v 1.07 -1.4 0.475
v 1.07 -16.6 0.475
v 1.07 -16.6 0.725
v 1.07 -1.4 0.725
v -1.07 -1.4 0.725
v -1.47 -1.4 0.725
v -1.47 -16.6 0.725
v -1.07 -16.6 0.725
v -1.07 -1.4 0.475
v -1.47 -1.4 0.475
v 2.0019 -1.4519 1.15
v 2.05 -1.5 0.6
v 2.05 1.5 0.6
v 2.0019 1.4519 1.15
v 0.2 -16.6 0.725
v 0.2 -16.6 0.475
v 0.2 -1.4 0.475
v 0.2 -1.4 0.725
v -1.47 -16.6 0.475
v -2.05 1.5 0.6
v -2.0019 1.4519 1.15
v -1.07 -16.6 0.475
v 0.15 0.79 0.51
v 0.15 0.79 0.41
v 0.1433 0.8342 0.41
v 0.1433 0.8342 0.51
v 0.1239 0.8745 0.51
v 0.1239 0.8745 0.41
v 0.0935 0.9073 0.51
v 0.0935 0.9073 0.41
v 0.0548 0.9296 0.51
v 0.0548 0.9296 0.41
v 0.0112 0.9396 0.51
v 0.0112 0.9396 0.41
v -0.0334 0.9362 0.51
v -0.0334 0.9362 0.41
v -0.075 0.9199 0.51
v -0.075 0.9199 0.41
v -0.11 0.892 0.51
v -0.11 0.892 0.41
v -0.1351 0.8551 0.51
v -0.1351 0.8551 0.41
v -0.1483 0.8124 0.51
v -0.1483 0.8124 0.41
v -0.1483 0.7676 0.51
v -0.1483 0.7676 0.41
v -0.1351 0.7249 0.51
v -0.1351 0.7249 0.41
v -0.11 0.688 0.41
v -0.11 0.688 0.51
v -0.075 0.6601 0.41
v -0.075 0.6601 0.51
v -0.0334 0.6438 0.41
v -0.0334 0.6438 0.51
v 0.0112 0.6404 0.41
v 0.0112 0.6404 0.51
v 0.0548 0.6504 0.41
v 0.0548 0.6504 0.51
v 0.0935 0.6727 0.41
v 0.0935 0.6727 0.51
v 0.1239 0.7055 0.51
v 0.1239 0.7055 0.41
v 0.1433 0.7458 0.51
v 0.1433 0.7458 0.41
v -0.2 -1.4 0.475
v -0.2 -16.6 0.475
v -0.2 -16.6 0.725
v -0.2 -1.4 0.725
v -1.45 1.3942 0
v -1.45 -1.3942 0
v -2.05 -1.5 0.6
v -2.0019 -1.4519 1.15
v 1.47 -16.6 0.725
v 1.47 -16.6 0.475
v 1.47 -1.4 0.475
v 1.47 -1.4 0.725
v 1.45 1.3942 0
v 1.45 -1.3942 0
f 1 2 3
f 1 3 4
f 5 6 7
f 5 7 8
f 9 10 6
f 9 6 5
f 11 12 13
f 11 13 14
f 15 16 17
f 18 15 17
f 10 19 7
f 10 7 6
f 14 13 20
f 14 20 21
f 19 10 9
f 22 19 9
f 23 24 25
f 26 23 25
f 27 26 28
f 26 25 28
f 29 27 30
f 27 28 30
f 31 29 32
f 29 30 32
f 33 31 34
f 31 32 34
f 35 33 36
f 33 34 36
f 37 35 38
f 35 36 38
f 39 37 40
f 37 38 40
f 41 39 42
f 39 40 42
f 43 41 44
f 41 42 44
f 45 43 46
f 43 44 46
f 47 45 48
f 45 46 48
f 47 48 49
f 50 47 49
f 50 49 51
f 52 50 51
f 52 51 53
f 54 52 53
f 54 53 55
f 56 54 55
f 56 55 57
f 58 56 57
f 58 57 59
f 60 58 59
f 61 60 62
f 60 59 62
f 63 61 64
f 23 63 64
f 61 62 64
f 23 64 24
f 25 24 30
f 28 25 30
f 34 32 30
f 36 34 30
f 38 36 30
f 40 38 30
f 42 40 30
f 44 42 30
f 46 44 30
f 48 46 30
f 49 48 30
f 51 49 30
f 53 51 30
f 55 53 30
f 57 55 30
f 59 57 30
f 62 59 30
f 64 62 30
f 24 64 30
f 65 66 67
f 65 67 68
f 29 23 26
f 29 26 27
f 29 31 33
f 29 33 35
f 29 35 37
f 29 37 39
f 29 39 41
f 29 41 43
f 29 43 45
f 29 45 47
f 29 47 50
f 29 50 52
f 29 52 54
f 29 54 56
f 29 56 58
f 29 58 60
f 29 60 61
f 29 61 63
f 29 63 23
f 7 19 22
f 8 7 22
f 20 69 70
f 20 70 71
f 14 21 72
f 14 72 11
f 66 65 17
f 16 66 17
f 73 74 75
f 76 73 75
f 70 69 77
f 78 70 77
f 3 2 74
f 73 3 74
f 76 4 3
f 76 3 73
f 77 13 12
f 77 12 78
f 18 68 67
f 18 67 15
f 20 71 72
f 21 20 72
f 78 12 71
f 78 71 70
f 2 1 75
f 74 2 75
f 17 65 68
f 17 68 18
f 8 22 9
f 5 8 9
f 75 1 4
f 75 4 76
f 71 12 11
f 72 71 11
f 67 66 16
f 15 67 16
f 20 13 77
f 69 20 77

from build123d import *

# Parameters (mm, degrees)
SKETCH_1_W             = 4.1
SKETCH_1_H             = 3
EXTRUDE_1_DEPTH        = 1.15
CUT_EXTRUDE_1_DEPTH    = 4.8111678
CUT_EXTRUDE_2_DEPTH    = 5.926966612
EXTRUDE_2_DEPTH        = 0.125
EXTRUDE_2_DEPTH_BACK   = 0.125
SKETCH_5_W             = 0.4
SKETCH_5_H             = 15.2
EXTRUDE_2_2_DEPTH      = 0.125
EXTRUDE_2_2_DEPTH_BACK = 0.125
EXTRUDE_2_3_DEPTH      = 0.125
EXTRUDE_2_3_DEPTH_BACK = 0.125
SKETCH_7_R             = 0.15
EXTRUDE_3_DEPTH        = 0.1


with BuildPart() as part:
    # 草圖1 → 填料-伸長1 (new body)
    with BuildSketch(Plane.XY):
        Rectangle(SKETCH_1_W, SKETCH_1_H)
    extrude(amount=EXTRUDE_1_DEPTH)

    # 草圖2 → 除料-伸長1 (cut, through all)
    with BuildSketch(Plane.XZ.offset(1.5)):
        Polygon((-1.45, 0), (-2.05, 0.6), (-2.05, 0), align=None)
        Polygon((2.05, 0.6), (1.45, 0), (2.05, 0), align=None)
        Polygon((-2.05, 0.6), (-2.001881235, 1.15), (-2.05, 1.15), align=None)
        Polygon((2.05, 0.6), (2.001881235, 1.15), (2.05, 1.15), align=None)
    extrude(amount=-CUT_EXTRUDE_1_DEPTH, mode=Mode.SUBTRACT)

    # 草圖3 → 除料-伸長2 (cut, through all)
    with BuildSketch(Plane(origin=(2.5, 0, 0), x_dir=(0, 0, -1), z_dir=(1, 0, 0))):
        Polygon((0, -1.5), (-0.6, -1.5), (0, -1.394203812), align=None)
        Polygon((-0.6, -1.5), (-1.15, -1.451881235), (-1.15, -1.5), align=None)
        Polygon((-0.6, 1.5), (-1.15, 1.451881235), (-1.15, 1.5), align=None)
        Polygon((-0.6, 1.5), (0, 1.394203812), (0, 1.5), align=None)
    extrude(amount=-CUT_EXTRUDE_2_DEPTH, mode=Mode.SUBTRACT)


with BuildPart() as body_2:
    # 草圖5 → 填料-伸長2 (new, two sides: drawn at the far end of the back side and taken through both)
    with BuildSketch(Plane.XY.offset(0.6).offset(-EXTRUDE_2_DEPTH_BACK)):
        with Locations((-1.27, -9)):
            Rectangle(SKETCH_5_W, SKETCH_5_H)
    extrude(amount=EXTRUDE_2_DEPTH + EXTRUDE_2_DEPTH_BACK)


with BuildPart() as body_3:
    # 草圖5 → Extrude 2 2 (new, two sides: drawn at the far end of the back side and taken through both)
    with BuildSketch(Plane.XY.offset(0.6).offset(-EXTRUDE_2_2_DEPTH_BACK)):
        with Locations((0, -9)):
            Rectangle(SKETCH_5_W, SKETCH_5_H)
    extrude(amount=EXTRUDE_2_2_DEPTH + EXTRUDE_2_2_DEPTH_BACK)


with BuildPart() as body_4:
    # 草圖5 → Extrude 2 3 (new, two sides: drawn at the far end of the back side and taken through both)
    with BuildSketch(Plane.XY.offset(0.6).offset(-EXTRUDE_2_3_DEPTH_BACK)):
        with Locations((1.27, -9)):
            Rectangle(SKETCH_5_W, SKETCH_5_H)
    extrude(amount=EXTRUDE_2_3_DEPTH + EXTRUDE_2_3_DEPTH_BACK)


with BuildPart() as body_5:
    # 草圖7 → 填料-伸長3 (new body)
    with BuildSketch(Plane.XY.offset(0.41)):
        with Locations((0, 0.79)):
            Circle(SKETCH_7_R)
    extrude(amount=EXTRUDE_3_DEPTH)


solid = Compound([part.part, body_2.part, body_3.part, body_4.part, body_5.part])
